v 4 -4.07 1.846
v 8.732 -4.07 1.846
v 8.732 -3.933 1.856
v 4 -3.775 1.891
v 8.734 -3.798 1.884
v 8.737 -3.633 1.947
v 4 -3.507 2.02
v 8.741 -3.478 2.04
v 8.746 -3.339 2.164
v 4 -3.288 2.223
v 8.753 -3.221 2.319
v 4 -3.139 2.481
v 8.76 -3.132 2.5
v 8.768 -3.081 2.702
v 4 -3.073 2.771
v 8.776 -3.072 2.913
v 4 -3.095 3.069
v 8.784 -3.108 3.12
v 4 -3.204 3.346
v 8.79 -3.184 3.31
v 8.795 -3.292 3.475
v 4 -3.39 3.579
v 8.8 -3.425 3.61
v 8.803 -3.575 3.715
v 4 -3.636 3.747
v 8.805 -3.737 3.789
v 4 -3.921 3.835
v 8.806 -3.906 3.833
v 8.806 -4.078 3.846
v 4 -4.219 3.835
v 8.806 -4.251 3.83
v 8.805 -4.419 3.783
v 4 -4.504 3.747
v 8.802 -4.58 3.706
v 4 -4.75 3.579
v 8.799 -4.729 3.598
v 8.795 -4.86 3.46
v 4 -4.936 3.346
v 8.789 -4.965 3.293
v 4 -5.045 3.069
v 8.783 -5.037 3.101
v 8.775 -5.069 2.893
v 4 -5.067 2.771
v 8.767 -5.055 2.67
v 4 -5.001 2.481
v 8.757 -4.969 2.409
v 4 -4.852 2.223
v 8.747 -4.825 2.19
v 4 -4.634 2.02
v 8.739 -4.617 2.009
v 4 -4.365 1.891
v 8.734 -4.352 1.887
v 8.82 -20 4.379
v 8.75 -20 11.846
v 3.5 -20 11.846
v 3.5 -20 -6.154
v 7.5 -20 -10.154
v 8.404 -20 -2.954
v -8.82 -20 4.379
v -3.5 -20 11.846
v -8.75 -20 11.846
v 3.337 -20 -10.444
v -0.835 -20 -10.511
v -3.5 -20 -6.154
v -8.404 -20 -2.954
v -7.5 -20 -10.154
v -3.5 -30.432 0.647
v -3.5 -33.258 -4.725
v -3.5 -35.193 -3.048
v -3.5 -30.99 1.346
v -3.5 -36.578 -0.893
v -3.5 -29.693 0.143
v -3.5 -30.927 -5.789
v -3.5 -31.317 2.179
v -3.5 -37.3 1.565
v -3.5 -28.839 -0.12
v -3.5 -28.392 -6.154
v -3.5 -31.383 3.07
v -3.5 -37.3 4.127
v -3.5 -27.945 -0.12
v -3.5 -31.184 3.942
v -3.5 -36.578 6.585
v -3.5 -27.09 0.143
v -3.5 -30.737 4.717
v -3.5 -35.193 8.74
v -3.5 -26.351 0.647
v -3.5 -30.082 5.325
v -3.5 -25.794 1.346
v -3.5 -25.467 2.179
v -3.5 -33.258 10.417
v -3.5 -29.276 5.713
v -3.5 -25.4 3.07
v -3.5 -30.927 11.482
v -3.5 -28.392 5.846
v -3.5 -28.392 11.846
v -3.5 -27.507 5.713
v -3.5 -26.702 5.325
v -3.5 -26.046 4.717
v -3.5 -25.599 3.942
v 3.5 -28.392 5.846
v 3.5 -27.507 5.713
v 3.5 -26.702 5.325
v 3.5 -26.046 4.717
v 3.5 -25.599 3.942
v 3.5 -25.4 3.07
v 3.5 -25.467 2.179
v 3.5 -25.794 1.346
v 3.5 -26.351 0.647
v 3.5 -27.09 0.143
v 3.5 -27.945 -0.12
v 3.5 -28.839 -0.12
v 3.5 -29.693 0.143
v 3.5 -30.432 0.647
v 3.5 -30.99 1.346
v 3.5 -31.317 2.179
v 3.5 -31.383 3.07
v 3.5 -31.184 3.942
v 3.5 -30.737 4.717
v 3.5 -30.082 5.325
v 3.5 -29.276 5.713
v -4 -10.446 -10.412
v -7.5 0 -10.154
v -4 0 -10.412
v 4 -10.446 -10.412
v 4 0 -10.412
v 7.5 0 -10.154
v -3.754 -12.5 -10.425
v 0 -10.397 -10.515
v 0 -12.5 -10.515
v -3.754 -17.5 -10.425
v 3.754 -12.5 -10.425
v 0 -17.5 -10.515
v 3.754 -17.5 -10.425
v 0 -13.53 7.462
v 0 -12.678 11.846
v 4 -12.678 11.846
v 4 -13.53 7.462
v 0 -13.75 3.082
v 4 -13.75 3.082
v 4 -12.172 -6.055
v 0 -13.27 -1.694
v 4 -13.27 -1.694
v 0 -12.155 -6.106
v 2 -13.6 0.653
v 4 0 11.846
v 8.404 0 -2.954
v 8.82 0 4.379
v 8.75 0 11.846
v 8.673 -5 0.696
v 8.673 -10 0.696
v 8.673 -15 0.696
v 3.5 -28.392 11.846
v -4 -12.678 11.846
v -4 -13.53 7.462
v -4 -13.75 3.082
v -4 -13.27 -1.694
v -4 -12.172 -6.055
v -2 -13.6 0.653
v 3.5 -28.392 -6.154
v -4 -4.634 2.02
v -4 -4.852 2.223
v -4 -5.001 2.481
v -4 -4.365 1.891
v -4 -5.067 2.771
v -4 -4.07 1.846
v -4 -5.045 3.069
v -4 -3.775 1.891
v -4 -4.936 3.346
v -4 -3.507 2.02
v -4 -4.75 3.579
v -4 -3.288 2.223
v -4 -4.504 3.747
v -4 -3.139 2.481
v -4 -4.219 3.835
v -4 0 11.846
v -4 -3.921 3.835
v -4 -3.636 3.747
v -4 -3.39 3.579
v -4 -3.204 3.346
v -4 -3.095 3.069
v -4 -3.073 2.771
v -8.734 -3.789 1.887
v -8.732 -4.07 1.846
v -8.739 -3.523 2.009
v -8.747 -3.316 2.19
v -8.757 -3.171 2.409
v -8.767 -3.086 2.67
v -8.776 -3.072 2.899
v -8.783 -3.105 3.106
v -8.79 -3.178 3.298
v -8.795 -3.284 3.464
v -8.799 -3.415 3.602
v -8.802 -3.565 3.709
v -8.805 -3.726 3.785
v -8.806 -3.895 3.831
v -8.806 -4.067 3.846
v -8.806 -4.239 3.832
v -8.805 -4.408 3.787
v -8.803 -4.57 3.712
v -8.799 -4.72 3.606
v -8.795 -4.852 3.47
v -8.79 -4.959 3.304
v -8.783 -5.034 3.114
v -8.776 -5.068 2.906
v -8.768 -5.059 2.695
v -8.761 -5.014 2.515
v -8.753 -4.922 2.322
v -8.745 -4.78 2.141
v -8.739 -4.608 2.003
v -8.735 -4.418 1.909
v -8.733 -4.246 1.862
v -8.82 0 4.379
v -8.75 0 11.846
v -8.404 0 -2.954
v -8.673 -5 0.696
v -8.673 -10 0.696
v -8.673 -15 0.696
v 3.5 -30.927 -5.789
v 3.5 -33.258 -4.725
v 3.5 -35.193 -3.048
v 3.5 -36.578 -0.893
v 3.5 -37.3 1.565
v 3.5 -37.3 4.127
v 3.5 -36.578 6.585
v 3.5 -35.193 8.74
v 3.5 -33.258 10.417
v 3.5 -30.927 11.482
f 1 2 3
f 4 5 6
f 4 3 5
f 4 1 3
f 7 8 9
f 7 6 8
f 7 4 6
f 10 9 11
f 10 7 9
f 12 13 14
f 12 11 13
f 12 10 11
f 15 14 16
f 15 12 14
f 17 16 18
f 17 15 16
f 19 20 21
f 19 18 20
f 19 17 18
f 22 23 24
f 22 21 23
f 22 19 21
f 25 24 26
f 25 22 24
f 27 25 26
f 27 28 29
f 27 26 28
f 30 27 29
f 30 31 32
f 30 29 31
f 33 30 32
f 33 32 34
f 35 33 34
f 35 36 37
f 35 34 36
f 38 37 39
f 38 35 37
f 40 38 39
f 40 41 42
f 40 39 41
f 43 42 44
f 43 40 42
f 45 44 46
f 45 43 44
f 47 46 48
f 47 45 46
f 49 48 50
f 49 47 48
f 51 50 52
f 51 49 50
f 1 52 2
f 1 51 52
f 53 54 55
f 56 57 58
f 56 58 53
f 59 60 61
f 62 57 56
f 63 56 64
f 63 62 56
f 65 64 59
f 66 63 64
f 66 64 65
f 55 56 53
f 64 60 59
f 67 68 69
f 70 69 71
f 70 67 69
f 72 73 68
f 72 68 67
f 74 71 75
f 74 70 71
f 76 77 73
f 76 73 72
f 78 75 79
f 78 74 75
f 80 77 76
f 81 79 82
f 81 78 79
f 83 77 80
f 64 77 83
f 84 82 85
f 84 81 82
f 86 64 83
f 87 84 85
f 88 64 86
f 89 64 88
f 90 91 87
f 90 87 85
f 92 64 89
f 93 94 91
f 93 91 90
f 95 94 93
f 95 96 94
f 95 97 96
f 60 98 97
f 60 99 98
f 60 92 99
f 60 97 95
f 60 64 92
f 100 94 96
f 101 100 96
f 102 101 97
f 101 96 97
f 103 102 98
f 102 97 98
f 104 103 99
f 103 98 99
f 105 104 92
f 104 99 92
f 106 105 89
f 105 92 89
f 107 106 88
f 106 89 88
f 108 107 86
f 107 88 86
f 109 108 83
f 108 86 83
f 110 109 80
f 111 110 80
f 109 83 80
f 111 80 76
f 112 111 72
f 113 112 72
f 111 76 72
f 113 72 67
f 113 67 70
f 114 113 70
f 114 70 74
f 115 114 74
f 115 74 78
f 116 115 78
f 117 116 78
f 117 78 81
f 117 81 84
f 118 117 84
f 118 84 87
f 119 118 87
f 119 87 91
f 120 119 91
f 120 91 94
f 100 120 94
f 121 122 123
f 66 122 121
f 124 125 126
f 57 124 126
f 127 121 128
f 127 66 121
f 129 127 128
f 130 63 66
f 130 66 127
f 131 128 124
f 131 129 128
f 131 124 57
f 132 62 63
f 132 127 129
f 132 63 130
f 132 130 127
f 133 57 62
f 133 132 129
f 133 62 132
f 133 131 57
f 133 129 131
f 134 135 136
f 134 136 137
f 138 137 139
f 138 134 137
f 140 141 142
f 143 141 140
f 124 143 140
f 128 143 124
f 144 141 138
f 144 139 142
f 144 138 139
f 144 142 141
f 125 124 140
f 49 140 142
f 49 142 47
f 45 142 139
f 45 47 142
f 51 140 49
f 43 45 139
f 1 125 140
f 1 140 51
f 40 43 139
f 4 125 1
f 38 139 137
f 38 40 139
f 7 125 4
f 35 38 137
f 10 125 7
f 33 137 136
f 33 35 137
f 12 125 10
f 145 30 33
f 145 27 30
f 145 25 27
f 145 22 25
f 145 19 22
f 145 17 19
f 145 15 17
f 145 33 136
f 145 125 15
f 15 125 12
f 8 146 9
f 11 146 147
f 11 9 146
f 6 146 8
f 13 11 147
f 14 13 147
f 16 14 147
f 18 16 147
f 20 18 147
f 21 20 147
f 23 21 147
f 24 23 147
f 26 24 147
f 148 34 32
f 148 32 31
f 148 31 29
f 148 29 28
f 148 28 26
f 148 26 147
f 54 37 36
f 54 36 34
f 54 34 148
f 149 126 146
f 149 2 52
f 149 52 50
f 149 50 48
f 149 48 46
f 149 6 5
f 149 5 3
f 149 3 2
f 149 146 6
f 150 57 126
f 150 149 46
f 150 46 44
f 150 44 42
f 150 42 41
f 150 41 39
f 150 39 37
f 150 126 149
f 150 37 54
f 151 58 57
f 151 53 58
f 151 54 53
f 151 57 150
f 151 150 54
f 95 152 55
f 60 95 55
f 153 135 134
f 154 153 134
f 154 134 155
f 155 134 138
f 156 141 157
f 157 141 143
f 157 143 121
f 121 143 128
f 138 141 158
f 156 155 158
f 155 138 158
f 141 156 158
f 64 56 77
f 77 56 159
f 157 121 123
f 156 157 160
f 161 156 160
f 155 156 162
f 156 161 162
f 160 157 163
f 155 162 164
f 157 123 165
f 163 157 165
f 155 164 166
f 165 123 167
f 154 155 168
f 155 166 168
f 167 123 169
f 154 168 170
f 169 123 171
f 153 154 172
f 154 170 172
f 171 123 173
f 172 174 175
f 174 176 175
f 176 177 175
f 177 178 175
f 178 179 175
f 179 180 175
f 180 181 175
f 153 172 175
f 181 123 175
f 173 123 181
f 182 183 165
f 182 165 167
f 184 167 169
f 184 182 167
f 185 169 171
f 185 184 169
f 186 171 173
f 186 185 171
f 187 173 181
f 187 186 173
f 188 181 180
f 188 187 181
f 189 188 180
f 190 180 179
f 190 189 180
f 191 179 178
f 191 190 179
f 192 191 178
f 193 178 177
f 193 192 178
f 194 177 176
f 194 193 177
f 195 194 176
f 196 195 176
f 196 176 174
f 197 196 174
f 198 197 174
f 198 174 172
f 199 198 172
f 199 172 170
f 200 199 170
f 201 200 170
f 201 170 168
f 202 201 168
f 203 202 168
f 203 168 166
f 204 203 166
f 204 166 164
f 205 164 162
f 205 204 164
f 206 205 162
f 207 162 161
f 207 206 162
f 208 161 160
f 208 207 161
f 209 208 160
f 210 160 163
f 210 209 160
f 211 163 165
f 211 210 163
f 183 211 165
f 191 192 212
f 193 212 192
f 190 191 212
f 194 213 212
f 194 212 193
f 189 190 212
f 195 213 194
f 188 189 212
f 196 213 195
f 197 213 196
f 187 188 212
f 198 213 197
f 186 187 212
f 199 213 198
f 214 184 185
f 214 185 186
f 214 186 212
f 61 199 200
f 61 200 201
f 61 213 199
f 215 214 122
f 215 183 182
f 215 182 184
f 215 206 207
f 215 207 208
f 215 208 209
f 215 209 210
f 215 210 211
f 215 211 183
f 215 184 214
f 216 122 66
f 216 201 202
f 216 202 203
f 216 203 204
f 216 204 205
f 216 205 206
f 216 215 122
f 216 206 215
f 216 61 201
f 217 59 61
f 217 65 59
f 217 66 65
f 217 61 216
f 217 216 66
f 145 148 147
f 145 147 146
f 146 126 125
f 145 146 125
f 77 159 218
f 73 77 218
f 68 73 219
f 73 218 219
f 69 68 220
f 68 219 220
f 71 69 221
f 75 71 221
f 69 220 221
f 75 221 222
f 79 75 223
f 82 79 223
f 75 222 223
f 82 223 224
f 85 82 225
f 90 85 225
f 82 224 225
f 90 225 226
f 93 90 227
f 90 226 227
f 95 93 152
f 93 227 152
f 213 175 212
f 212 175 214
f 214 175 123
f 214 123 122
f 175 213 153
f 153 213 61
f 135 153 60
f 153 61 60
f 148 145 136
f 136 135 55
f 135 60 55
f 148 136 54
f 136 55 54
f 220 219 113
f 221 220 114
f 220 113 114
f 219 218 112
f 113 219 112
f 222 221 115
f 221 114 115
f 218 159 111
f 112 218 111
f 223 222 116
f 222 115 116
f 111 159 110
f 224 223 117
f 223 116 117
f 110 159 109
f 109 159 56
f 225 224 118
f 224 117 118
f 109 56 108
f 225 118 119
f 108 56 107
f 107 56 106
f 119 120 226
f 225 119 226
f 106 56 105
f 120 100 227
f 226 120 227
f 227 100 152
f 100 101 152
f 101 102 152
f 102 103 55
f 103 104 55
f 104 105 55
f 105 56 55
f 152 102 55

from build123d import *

# Parameters (mm, degrees)
LOFT_START                = -20
LOFT_2_DEPTH              = 20
SLOT_BOSS_EXTRUDE_DEPTH   = 3.5
NOTCH_CUT_EXTRUDE_DEPTH   = 4
F_6_0MM_DOWEL_HOLE1_D     = 6
CUT_EXTRUDE1_DEPTH        = 41.209626458
CUT_EXTRUDE1_DEPTH_BACK   = 41.209626458
F_2MM_DOWEL_HOLE_SKETCH_R = 1


# Read off the part's stored shape, not the designer's step: Loft
with BuildPart() as part:
    # Loft 2 outline → Loft 2 (new body)
    with BuildSketch(Plane(origin=(0, 0, 0), x_dir=(1.0, -2.490035096657917e-12, 0), z_dir=(2.490035096657917e-12, 1.0, -1.6178493389115347e-12)).offset(LOFT_START)):
        with BuildLine():
            add(Edge.make_bspline(
                [(-7.500000006, 10.153846153), (-6.876918809, 10.213864714), (-5.629329261, 10.319078273), (-3.754701534, 10.432067478), (-1.877896778, 10.499966465), (-0.625965179, 10.515066492), (0.625965179, 10.515066492), (1.877896376, 10.499966465), (3.754699934, 10.432067556), (5.629330497, 10.319078204), (6.876918808, 10.213864714), (7.5, 10.153846153)],
                knots=[0.804050837, 0.804050837, 0.804050837, 0.804050837, 0.828544483, 0.853038128, 0.877531773, 0.902025419, 0.902025419, 0.926519064, 0.951012709, 0.975506355, 1, 1, 1, 1], degree=3))
            add(Edge.make_bspline(
                [(-8.749999999, -11.846153861), (-8.82839887, -9.962671759), (-8.893913844, -6.220781941), (-8.718337998, -0.683170366), (-8.268913846, 4.779218054), (-7.786732208, 8.370661565), (-7.500000006, 10.153846153)],
                knots=[0.516152852, 0.516152852, 0.516152852, 0.516152852, 0.588127348, 0.660101844, 0.732076341, 0.804050837, 0.804050837, 0.804050837, 0.804050837], degree=3))
            Line((-8.749999999, -11.846153861), (8.75, -11.846153846))
            add(Edge.make_bspline(
                [(7.5, 10.153846153), (7.786732204, 8.370661588), (8.268913844, 4.779218073), (8.718337998, -0.683170354), (8.893913844, -6.220781934), (8.82839887, -9.962671757), (8.75, -11.846153846)],
                knots=[0, 0, 0, 0, 0.071974497, 0.143948993, 0.21592349, 0.287897986, 0.287897986, 0.287897986, 0.287897986], degree=3))
        make_face()
    extrude(amount=LOFT_2_DEPTH)

    # Slot Sketch → Slot Boss-Extrude (add, symmetric)
    with BuildSketch(Plane(origin=(0, 0, 0), x_dir=(0, 0, -1), z_dir=(1, 0, 0))):
        with BuildLine():
            Line((-11.846153846, -28.391743615), (-11.846153846, -12.033776613))
            ThreePointArc((-11.846153846, -12.033776613), (-2.846153846, -3.033776613), (6.153846154, -12.033776613))
            Line((6.153846154, -12.033776613), (6.153846154, -28.391743615))
            ThreePointArc((6.153846154, -28.391743615), (-2.846153846, -37.391743615), (-11.846153846, -28.391743615))
        make_face()
    extrude(amount=SLOT_BOSS_EXTRUDE_DEPTH, both=True)

    # Notch Sketch → Notch Cut-Extrude (cut, symmetric)
    with BuildSketch(Plane(origin=(0, 0, 0), x_dir=(0, 0, -1), z_dir=(1, 0, 0))):
        with BuildLine():
            Line((-15.97451802, -11.299393728), (-15.524991842, 1.708253078))
            Line((-15.524991842, 1.708253078), (11.860726968, 1.708253078))
            Line((11.860726968, 1.708253078), (11.18600525, -10.073329121))
            add(Edge.make_bspline(
                [(-15.97451802, -11.299393728), (-2.356980938, -16.766629454), (11.18600525, -10.073329121)],
                knots=[0, 0, 0, 1, 1, 1], degree=2))
        make_face()
    extrude(amount=NOTCH_CUT_EXTRUDE_DEPTH, both=True, mode=Mode.SUBTRACT)

    # Ø6.0mm Dowel Hole1 (through all)
    with Locations(Plane(origin=(3.5, 0, 0), x_dir=(0, 0, -1), z_dir=(1, 0, 0))):
        with Locations((-2.846153846, -28.391743615)):
            Hole(F_6_0MM_DOWEL_HOLE1_D / 2)

    # 2mm Dowel Hole Sketch → Cut-Extrude1 (cut, two sides: drawn at the far end of the back side and taken through both)
    with BuildSketch(Plane(origin=(0, 0, 0), x_dir=(0, 0, -1), z_dir=(1, 0, 0)).offset(-CUT_EXTRUDE1_DEPTH_BACK)):
        with Locations((-2.846153846, -4.070213016)):
            Circle(F_2MM_DOWEL_HOLE_SKETCH_R)
    extrude(amount=CUT_EXTRUDE1_DEPTH + CUT_EXTRUDE1_DEPTH_BACK, mode=Mode.SUBTRACT)


solid = part.part
